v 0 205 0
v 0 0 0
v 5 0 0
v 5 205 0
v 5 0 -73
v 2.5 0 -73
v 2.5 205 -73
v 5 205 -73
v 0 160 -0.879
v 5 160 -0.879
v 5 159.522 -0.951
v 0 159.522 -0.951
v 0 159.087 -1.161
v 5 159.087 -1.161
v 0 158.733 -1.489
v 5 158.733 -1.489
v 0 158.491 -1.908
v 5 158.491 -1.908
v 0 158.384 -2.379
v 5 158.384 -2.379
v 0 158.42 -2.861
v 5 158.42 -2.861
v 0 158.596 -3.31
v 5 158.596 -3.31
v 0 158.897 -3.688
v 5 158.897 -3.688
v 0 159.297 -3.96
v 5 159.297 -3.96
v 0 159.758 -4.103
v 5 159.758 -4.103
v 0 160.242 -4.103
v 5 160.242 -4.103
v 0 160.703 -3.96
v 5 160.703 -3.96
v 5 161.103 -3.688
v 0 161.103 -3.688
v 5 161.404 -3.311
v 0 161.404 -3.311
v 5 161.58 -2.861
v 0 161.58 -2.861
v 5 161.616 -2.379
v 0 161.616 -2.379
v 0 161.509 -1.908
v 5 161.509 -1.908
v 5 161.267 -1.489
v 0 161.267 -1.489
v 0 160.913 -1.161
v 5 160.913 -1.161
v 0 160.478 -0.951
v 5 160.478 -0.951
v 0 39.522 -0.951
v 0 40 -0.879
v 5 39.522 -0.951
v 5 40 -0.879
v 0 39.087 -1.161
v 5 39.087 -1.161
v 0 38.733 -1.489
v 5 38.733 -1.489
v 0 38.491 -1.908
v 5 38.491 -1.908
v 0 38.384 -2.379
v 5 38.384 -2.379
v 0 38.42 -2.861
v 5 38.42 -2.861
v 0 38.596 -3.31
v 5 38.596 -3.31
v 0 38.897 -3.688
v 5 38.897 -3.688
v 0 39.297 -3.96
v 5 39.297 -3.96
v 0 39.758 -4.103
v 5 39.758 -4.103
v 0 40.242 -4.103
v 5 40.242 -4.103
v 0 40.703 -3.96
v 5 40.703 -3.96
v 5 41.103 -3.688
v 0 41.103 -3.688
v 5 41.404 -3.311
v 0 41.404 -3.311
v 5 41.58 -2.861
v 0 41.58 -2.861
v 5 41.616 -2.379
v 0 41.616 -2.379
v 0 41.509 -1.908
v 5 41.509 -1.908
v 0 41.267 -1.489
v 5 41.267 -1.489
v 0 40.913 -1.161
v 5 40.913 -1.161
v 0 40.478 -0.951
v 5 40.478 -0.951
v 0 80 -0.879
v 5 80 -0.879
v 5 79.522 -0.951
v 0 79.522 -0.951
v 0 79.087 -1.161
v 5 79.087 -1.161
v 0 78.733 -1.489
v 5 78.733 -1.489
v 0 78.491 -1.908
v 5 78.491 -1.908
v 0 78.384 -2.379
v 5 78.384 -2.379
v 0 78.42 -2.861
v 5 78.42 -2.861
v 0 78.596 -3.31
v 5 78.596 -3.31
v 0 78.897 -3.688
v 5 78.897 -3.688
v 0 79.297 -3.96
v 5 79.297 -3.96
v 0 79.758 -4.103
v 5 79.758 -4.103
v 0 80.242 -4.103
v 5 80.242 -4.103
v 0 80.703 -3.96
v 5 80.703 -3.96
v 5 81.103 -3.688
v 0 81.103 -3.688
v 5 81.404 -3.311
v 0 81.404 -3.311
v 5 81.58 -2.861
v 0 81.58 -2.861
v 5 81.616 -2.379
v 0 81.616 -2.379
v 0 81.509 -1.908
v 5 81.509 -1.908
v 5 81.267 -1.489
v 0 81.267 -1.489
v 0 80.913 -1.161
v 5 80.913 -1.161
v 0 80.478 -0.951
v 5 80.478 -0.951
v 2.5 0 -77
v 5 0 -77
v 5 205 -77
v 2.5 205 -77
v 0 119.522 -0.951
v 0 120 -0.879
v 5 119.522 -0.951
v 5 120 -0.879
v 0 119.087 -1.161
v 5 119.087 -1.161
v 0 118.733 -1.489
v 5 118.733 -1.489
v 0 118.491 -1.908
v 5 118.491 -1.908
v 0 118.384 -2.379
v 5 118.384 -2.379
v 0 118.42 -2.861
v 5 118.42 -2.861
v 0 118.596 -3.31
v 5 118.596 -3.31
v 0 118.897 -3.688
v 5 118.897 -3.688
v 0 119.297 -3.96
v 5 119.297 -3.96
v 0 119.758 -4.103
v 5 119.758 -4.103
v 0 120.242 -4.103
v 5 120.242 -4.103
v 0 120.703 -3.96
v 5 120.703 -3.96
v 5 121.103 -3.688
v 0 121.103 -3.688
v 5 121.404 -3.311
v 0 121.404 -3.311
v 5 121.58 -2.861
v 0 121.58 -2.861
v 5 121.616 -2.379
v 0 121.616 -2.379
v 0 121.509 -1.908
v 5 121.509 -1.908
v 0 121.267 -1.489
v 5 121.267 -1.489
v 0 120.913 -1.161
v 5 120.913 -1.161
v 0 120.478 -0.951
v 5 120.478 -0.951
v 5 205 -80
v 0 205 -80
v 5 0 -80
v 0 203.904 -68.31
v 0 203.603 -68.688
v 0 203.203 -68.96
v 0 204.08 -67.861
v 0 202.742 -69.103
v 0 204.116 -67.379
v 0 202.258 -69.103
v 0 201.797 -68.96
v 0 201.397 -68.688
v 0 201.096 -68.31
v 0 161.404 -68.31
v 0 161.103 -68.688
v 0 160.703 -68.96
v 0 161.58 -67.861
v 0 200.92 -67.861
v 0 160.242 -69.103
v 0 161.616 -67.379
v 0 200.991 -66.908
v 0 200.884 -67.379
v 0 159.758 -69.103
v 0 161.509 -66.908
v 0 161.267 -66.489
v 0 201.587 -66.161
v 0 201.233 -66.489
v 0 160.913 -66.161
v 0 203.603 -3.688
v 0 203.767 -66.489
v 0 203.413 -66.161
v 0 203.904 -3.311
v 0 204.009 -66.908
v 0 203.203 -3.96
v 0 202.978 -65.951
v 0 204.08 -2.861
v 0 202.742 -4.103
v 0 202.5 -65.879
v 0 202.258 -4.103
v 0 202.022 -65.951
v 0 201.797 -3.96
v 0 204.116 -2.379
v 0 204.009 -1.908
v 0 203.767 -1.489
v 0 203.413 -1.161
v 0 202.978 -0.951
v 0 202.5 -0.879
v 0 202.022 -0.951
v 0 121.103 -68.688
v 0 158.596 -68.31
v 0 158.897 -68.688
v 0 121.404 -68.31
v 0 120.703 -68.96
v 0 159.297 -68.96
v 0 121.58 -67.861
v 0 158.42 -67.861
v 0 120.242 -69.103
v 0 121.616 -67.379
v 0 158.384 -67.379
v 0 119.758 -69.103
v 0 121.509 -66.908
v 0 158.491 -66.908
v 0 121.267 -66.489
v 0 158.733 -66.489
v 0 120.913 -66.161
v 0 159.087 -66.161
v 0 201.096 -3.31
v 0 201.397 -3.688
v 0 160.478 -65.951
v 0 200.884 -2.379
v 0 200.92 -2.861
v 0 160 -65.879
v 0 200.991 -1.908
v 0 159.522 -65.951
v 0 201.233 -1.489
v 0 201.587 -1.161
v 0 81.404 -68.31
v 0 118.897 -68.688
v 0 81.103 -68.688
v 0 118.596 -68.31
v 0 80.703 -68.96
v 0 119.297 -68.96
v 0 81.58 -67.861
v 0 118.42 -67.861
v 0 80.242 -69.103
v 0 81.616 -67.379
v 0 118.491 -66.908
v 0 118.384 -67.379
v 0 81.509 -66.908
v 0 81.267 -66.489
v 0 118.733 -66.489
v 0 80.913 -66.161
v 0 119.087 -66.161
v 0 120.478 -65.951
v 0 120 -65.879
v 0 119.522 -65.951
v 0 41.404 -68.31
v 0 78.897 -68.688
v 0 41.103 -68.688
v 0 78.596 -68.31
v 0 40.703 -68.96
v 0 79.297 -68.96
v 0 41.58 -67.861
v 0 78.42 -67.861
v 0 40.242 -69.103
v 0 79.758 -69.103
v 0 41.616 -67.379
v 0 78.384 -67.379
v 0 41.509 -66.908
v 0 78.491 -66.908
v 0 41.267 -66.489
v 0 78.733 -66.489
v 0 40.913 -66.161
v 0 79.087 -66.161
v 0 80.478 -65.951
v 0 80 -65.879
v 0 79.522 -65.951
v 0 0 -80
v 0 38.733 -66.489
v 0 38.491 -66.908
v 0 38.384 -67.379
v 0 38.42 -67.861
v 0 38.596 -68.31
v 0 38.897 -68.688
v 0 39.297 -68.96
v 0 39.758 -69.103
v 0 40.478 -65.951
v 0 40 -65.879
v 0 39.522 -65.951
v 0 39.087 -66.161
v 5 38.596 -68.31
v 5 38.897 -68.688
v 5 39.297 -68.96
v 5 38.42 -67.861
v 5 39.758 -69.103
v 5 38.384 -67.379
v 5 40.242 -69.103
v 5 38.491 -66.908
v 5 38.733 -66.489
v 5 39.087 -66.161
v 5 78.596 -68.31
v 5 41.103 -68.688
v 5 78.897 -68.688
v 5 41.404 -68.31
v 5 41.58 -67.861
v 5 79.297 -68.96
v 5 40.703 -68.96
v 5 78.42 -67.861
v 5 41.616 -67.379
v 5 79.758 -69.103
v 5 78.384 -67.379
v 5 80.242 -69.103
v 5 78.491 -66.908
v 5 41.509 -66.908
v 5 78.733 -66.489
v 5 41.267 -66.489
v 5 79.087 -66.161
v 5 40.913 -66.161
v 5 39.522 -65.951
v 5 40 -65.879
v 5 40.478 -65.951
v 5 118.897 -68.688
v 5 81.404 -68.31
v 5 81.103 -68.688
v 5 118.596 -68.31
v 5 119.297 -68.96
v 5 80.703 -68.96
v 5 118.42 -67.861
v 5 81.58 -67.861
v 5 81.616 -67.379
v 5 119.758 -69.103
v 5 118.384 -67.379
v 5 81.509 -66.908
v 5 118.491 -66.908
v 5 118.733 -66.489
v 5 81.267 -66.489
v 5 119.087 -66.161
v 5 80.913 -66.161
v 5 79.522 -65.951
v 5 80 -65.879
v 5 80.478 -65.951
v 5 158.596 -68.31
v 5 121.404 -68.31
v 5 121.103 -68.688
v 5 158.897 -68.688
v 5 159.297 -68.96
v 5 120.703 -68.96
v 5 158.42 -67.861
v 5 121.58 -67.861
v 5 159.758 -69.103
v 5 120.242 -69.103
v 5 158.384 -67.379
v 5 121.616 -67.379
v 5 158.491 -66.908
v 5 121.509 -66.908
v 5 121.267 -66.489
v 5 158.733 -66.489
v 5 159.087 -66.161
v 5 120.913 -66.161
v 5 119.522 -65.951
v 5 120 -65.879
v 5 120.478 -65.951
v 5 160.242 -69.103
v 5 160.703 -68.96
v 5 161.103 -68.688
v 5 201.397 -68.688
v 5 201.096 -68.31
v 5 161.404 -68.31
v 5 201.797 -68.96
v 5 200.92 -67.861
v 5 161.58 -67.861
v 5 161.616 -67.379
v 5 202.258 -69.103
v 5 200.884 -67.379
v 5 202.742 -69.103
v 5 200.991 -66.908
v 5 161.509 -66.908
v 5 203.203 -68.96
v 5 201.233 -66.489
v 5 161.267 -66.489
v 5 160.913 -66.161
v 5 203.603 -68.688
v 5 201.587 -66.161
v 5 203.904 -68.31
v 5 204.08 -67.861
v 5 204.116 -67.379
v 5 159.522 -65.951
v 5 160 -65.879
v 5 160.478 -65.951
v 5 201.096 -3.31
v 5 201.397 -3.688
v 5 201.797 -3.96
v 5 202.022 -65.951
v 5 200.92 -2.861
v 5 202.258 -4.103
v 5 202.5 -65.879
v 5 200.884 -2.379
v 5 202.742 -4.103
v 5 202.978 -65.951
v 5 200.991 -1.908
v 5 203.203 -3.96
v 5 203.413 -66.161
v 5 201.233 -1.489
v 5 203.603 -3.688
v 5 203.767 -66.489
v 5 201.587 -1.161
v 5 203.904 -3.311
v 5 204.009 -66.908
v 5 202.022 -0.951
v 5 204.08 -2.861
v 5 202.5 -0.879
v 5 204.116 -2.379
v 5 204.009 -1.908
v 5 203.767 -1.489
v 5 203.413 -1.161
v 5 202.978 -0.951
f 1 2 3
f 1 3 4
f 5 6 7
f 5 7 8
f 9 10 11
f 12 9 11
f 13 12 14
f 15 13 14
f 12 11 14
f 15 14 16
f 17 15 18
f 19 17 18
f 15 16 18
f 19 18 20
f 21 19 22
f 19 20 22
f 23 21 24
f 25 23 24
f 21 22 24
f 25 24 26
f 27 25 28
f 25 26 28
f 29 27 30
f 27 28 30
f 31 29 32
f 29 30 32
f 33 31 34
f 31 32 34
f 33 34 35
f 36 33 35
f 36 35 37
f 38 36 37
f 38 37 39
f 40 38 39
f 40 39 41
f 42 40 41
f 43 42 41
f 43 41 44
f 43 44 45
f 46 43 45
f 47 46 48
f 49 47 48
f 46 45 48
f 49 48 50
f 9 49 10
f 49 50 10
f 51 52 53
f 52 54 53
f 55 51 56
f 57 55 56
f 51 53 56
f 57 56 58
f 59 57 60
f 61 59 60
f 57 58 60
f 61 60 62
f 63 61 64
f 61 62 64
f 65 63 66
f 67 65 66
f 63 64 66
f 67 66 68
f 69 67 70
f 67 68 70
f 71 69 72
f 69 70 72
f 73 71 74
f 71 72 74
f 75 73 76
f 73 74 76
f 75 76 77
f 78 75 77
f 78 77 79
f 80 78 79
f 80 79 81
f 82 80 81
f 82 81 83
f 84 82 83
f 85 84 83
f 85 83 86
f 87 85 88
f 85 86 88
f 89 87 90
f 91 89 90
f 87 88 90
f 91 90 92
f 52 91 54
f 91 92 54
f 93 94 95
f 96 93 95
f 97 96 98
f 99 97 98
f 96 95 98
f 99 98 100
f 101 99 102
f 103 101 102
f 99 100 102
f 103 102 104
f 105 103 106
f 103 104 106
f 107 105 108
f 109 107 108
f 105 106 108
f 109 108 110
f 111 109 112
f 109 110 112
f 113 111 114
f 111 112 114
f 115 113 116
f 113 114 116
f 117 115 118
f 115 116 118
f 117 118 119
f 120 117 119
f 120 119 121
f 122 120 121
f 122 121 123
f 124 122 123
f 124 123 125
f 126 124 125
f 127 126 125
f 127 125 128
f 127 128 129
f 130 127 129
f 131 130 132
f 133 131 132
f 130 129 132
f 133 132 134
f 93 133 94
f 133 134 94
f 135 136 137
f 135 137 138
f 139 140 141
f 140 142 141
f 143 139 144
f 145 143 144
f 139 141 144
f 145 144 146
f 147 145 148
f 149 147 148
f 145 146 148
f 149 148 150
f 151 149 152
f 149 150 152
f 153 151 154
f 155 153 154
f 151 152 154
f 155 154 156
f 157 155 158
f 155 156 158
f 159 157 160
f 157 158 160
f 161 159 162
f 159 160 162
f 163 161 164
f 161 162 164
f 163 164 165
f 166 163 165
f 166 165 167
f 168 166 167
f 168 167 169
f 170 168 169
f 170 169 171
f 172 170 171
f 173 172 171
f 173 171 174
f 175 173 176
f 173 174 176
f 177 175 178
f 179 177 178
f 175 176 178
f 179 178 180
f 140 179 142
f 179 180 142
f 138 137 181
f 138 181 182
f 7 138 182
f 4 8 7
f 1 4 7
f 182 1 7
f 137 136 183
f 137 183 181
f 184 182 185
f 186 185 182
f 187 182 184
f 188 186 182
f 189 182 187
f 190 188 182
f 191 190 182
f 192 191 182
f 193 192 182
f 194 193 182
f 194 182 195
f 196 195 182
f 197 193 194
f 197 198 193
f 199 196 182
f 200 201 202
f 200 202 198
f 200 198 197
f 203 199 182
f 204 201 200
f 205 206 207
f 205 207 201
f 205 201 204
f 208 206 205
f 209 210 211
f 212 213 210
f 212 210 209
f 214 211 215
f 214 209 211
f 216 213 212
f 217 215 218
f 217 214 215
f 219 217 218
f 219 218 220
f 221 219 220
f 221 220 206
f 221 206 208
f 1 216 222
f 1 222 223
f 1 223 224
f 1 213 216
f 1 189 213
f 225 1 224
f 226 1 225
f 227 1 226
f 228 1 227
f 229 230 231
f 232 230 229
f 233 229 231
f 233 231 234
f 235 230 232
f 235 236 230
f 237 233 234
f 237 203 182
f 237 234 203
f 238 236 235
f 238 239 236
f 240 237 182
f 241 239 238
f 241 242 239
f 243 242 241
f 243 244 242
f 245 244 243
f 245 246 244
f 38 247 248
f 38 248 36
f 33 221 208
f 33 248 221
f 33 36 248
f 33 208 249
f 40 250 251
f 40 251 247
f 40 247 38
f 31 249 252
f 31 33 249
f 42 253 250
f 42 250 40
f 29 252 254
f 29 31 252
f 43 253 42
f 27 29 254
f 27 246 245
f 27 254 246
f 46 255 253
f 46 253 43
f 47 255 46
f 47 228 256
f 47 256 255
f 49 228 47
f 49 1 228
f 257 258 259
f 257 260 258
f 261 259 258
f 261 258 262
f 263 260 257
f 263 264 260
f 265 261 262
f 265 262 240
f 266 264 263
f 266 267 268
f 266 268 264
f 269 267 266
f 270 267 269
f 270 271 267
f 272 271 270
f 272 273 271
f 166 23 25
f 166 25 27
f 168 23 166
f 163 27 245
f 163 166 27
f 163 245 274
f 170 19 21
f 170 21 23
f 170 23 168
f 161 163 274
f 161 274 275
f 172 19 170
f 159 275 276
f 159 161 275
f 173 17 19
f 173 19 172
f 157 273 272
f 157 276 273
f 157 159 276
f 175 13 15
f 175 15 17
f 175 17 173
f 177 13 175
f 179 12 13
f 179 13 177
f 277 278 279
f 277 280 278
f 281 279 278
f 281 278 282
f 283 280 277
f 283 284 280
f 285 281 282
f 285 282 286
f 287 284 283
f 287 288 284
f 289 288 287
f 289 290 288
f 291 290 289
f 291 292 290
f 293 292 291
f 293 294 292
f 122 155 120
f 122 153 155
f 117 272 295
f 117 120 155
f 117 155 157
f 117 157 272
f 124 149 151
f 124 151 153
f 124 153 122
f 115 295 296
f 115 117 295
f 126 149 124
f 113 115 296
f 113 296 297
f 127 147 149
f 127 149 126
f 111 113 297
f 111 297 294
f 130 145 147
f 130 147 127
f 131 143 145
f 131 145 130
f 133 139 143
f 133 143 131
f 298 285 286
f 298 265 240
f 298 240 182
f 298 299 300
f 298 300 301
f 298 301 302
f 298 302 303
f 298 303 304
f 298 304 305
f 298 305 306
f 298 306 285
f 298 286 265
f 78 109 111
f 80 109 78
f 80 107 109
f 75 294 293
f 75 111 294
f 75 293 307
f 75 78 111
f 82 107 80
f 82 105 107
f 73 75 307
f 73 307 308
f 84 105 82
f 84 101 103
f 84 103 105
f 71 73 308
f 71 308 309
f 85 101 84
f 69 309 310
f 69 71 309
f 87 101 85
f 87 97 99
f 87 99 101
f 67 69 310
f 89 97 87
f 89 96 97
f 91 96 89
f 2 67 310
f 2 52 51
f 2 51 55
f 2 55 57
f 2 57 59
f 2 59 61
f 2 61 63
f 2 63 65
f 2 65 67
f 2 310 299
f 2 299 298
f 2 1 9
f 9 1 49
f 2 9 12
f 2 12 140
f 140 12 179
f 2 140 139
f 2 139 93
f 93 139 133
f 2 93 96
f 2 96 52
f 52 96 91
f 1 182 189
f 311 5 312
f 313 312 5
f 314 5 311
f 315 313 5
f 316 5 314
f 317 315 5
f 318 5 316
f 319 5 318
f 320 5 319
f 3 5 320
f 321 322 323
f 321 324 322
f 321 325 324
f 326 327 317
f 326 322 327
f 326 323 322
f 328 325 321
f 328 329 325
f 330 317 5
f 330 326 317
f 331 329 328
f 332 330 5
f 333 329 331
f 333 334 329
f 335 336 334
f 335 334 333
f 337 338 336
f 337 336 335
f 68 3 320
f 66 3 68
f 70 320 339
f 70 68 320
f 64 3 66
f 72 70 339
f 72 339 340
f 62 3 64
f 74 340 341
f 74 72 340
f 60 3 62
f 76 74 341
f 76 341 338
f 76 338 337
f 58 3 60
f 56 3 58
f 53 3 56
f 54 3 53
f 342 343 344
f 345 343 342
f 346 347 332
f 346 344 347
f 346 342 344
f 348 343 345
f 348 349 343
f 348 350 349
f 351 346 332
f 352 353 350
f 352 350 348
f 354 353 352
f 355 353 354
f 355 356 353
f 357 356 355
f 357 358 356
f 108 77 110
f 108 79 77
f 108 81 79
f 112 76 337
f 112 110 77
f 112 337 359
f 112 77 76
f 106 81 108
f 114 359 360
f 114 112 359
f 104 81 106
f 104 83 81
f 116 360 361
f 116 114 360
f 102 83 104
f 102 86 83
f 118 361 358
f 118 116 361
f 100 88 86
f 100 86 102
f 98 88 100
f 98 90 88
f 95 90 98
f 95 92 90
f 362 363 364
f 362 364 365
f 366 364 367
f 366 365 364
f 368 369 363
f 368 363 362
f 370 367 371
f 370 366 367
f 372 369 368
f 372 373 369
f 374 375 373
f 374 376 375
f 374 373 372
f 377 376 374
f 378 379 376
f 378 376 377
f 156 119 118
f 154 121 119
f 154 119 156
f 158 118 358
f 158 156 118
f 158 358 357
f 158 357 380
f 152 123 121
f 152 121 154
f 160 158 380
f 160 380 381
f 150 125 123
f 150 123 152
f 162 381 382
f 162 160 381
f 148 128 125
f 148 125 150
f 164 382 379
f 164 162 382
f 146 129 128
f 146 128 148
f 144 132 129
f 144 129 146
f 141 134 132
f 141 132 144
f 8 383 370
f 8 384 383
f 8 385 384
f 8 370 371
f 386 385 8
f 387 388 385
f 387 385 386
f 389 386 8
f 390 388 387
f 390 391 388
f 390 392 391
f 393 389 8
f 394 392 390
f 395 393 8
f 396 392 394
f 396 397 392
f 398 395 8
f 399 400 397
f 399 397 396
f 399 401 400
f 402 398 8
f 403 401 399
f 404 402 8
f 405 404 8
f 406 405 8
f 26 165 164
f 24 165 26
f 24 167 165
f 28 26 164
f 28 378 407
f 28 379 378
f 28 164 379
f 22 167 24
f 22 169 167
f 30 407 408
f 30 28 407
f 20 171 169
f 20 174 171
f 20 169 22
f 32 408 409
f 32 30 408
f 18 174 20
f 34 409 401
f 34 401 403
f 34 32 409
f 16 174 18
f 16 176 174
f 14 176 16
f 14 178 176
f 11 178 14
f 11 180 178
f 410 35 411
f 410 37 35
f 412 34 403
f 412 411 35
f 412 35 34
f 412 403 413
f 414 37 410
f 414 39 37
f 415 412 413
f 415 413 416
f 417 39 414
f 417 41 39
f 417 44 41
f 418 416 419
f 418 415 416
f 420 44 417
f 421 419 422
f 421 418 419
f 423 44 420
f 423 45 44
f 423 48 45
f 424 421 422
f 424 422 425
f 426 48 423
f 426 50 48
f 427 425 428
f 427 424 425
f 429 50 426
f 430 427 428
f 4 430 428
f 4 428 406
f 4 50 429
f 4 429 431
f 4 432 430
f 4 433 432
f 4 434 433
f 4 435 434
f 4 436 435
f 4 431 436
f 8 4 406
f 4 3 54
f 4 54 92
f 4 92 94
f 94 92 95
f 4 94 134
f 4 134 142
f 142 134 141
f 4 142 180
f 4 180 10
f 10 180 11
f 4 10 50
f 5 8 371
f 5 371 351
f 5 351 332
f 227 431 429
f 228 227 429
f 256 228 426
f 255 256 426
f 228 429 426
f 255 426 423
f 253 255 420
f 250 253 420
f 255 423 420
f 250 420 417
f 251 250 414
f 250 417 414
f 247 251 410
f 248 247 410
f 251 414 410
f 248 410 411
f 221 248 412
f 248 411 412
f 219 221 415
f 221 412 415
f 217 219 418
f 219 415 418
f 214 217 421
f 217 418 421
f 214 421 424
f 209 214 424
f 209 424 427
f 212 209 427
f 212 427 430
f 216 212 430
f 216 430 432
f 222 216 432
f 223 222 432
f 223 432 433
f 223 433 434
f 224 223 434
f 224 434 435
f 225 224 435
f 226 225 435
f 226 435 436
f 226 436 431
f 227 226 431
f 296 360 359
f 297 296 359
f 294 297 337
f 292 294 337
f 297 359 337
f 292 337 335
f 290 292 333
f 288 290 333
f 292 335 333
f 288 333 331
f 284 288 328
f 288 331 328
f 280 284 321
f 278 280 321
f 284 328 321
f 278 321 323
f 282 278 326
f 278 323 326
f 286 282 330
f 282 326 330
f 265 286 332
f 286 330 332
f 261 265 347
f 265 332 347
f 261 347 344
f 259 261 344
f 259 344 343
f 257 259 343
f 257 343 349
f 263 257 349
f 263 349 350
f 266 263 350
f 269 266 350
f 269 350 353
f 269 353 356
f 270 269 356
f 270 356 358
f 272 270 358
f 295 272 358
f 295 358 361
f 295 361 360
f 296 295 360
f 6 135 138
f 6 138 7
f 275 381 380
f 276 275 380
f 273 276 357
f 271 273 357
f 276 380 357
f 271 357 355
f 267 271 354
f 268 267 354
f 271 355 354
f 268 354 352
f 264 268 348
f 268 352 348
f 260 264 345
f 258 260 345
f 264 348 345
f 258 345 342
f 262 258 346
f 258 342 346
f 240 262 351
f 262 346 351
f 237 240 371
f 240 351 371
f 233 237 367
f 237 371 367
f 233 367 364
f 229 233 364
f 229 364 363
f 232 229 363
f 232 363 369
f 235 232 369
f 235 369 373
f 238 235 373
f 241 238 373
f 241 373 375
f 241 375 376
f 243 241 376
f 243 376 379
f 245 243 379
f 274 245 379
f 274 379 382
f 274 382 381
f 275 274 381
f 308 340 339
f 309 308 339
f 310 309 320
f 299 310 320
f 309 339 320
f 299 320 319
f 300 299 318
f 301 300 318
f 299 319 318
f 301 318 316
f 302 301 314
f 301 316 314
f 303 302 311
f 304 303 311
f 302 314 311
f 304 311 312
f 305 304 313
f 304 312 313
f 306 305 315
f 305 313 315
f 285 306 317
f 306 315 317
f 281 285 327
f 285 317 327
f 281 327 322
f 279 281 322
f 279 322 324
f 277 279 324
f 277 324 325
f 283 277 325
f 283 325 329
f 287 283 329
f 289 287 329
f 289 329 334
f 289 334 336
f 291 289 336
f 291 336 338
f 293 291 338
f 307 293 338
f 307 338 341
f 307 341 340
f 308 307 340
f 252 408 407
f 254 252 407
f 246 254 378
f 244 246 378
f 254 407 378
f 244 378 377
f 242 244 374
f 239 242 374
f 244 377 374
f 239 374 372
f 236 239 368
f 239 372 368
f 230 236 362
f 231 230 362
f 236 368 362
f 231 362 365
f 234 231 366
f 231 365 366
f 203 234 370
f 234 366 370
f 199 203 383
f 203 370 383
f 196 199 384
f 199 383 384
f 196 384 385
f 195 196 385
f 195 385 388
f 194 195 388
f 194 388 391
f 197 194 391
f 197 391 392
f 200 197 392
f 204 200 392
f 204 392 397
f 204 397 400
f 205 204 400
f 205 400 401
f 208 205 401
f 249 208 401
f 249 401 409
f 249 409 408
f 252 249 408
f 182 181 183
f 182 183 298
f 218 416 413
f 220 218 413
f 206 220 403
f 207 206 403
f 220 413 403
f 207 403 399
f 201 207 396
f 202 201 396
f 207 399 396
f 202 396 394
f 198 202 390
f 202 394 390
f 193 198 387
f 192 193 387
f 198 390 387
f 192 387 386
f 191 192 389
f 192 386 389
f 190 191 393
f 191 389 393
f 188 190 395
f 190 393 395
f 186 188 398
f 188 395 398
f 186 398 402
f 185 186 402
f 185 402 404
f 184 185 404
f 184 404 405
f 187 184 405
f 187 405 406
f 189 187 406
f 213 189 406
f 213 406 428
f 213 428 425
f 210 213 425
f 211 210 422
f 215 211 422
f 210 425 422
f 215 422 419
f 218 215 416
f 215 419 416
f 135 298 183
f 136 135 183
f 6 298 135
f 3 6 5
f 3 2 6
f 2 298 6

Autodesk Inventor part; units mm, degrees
ref_plane "YZ Plane" through (0, 0, 0) normal (1, 0, 0) x (0, 1, 0)
ref_plane "XZ Plane" through (0, 0, 0) normal (0, 1, 0) x (-1, 0, 0)
ref_plane "XY Plane" through (0, 0, 0) normal (0, 0, 1) x (1, 0, 0)
sketch "Sketch1" plane through (0, 0, 0) normal (1, 0, 0) x (0, 1, 0)
  line L0 (0, 0) -> (205, 0)
  line L1 (205, 0) -> (205, -70)
  line L2 (205, -70) -> (0, -70)
  line L3 (0, -70) -> (0, 0)
  circle A0 centre (40, -2.5) radius 1
  circle A1 centre (80, -2.5) radius 1
  circle A2 centre (120, -2.5) radius 1
  circle A3 centre (160, -2.5) radius 1
  line L4 (0, 0) -> (0, 5)
  circle A4 centre (202.5, -2.5) radius 1.1944
  line L5 (0, -35) -> (205, -35) construction
  point P0 (40, -67.5)
  point P1 (80, -67.5)
  point P2 (120, -67.5)
  point P3 (160, -67.5)
  point P4 (202.5, -67.5)
  dimension "d0" = 205
  dimension "d1" = 70
  dimension "d2" = 2
  dimension "d3" = 2
  dimension "d4" = 2
  dimension "d5" = 2
  dimension "d7" = 40
  dimension "d8" = 40
  dimension "d9" = 40
  dimension "d10" = 2.5
  dimension "d11" = 40
  dimension "d12" = 2.5
extrude "Extrusion1" add sketch "Sketch1" along normal blind 5 contours L0 L1 L2 L3 | A0 | A1 | A2 | A3 | A4
hole "Hole1" at (0, 202.5, -67.5) at (0, 160, -67.5) at (0, 120, -67.5) at (0, 80, -67.5) at (0, 40, -67.5) at (0, 40, -2.5) at (0, 80, -2.5) at (0, 120, -2.5) at (0, 160, -2.5) at (0, 202.5, -2.5) direction (1, 0, 0) diameter 3.242 depth 11.8 thread size "M4x0.7" class "6H" standard "ANSI Metric M Profile"
sketch "Sketch2" plane through (0, 0, -70) normal (0, 0, -1) x (-1, 0, 0)
  line L0 (0, 205) -> (0, 0) projected
  line L1 (-5, 205) -> (0, 205)
  line L2 (0, 205) -> (0, 0)
  line L3 (0, 0) -> (-5, 0)
  line L4 (-5, 0) -> (-5, 205)
extrude "Extrusion2" add sketch "Sketch2" along normal blind 10
sketch "Sketch3" plane through (0, 0, 0) normal (0, -1, 0) x (1, 0, 0)
  line L0 (5, 0) -> (5, -80) projected
  line L1 (5, -80) -> (5, -70)
  line L2 (5, -77) -> (2.5, -77)
  line L3 (2.5, -77) -> (2.5, -73)
  line L4 (2.5, -73) -> (5, -73)
  line L5 (5, -80) -> (0, -80) projected
  point P0 (0, 0)
  dimension "d24" = 10
  dimension "d25" = 2.5
  dimension "d26" = 4
  dimension "d27" = 3
extrude "Extrusion3" cut sketch "Sketch3" against normal up to surface (205 mm away)
properties part number "SidePanel"
